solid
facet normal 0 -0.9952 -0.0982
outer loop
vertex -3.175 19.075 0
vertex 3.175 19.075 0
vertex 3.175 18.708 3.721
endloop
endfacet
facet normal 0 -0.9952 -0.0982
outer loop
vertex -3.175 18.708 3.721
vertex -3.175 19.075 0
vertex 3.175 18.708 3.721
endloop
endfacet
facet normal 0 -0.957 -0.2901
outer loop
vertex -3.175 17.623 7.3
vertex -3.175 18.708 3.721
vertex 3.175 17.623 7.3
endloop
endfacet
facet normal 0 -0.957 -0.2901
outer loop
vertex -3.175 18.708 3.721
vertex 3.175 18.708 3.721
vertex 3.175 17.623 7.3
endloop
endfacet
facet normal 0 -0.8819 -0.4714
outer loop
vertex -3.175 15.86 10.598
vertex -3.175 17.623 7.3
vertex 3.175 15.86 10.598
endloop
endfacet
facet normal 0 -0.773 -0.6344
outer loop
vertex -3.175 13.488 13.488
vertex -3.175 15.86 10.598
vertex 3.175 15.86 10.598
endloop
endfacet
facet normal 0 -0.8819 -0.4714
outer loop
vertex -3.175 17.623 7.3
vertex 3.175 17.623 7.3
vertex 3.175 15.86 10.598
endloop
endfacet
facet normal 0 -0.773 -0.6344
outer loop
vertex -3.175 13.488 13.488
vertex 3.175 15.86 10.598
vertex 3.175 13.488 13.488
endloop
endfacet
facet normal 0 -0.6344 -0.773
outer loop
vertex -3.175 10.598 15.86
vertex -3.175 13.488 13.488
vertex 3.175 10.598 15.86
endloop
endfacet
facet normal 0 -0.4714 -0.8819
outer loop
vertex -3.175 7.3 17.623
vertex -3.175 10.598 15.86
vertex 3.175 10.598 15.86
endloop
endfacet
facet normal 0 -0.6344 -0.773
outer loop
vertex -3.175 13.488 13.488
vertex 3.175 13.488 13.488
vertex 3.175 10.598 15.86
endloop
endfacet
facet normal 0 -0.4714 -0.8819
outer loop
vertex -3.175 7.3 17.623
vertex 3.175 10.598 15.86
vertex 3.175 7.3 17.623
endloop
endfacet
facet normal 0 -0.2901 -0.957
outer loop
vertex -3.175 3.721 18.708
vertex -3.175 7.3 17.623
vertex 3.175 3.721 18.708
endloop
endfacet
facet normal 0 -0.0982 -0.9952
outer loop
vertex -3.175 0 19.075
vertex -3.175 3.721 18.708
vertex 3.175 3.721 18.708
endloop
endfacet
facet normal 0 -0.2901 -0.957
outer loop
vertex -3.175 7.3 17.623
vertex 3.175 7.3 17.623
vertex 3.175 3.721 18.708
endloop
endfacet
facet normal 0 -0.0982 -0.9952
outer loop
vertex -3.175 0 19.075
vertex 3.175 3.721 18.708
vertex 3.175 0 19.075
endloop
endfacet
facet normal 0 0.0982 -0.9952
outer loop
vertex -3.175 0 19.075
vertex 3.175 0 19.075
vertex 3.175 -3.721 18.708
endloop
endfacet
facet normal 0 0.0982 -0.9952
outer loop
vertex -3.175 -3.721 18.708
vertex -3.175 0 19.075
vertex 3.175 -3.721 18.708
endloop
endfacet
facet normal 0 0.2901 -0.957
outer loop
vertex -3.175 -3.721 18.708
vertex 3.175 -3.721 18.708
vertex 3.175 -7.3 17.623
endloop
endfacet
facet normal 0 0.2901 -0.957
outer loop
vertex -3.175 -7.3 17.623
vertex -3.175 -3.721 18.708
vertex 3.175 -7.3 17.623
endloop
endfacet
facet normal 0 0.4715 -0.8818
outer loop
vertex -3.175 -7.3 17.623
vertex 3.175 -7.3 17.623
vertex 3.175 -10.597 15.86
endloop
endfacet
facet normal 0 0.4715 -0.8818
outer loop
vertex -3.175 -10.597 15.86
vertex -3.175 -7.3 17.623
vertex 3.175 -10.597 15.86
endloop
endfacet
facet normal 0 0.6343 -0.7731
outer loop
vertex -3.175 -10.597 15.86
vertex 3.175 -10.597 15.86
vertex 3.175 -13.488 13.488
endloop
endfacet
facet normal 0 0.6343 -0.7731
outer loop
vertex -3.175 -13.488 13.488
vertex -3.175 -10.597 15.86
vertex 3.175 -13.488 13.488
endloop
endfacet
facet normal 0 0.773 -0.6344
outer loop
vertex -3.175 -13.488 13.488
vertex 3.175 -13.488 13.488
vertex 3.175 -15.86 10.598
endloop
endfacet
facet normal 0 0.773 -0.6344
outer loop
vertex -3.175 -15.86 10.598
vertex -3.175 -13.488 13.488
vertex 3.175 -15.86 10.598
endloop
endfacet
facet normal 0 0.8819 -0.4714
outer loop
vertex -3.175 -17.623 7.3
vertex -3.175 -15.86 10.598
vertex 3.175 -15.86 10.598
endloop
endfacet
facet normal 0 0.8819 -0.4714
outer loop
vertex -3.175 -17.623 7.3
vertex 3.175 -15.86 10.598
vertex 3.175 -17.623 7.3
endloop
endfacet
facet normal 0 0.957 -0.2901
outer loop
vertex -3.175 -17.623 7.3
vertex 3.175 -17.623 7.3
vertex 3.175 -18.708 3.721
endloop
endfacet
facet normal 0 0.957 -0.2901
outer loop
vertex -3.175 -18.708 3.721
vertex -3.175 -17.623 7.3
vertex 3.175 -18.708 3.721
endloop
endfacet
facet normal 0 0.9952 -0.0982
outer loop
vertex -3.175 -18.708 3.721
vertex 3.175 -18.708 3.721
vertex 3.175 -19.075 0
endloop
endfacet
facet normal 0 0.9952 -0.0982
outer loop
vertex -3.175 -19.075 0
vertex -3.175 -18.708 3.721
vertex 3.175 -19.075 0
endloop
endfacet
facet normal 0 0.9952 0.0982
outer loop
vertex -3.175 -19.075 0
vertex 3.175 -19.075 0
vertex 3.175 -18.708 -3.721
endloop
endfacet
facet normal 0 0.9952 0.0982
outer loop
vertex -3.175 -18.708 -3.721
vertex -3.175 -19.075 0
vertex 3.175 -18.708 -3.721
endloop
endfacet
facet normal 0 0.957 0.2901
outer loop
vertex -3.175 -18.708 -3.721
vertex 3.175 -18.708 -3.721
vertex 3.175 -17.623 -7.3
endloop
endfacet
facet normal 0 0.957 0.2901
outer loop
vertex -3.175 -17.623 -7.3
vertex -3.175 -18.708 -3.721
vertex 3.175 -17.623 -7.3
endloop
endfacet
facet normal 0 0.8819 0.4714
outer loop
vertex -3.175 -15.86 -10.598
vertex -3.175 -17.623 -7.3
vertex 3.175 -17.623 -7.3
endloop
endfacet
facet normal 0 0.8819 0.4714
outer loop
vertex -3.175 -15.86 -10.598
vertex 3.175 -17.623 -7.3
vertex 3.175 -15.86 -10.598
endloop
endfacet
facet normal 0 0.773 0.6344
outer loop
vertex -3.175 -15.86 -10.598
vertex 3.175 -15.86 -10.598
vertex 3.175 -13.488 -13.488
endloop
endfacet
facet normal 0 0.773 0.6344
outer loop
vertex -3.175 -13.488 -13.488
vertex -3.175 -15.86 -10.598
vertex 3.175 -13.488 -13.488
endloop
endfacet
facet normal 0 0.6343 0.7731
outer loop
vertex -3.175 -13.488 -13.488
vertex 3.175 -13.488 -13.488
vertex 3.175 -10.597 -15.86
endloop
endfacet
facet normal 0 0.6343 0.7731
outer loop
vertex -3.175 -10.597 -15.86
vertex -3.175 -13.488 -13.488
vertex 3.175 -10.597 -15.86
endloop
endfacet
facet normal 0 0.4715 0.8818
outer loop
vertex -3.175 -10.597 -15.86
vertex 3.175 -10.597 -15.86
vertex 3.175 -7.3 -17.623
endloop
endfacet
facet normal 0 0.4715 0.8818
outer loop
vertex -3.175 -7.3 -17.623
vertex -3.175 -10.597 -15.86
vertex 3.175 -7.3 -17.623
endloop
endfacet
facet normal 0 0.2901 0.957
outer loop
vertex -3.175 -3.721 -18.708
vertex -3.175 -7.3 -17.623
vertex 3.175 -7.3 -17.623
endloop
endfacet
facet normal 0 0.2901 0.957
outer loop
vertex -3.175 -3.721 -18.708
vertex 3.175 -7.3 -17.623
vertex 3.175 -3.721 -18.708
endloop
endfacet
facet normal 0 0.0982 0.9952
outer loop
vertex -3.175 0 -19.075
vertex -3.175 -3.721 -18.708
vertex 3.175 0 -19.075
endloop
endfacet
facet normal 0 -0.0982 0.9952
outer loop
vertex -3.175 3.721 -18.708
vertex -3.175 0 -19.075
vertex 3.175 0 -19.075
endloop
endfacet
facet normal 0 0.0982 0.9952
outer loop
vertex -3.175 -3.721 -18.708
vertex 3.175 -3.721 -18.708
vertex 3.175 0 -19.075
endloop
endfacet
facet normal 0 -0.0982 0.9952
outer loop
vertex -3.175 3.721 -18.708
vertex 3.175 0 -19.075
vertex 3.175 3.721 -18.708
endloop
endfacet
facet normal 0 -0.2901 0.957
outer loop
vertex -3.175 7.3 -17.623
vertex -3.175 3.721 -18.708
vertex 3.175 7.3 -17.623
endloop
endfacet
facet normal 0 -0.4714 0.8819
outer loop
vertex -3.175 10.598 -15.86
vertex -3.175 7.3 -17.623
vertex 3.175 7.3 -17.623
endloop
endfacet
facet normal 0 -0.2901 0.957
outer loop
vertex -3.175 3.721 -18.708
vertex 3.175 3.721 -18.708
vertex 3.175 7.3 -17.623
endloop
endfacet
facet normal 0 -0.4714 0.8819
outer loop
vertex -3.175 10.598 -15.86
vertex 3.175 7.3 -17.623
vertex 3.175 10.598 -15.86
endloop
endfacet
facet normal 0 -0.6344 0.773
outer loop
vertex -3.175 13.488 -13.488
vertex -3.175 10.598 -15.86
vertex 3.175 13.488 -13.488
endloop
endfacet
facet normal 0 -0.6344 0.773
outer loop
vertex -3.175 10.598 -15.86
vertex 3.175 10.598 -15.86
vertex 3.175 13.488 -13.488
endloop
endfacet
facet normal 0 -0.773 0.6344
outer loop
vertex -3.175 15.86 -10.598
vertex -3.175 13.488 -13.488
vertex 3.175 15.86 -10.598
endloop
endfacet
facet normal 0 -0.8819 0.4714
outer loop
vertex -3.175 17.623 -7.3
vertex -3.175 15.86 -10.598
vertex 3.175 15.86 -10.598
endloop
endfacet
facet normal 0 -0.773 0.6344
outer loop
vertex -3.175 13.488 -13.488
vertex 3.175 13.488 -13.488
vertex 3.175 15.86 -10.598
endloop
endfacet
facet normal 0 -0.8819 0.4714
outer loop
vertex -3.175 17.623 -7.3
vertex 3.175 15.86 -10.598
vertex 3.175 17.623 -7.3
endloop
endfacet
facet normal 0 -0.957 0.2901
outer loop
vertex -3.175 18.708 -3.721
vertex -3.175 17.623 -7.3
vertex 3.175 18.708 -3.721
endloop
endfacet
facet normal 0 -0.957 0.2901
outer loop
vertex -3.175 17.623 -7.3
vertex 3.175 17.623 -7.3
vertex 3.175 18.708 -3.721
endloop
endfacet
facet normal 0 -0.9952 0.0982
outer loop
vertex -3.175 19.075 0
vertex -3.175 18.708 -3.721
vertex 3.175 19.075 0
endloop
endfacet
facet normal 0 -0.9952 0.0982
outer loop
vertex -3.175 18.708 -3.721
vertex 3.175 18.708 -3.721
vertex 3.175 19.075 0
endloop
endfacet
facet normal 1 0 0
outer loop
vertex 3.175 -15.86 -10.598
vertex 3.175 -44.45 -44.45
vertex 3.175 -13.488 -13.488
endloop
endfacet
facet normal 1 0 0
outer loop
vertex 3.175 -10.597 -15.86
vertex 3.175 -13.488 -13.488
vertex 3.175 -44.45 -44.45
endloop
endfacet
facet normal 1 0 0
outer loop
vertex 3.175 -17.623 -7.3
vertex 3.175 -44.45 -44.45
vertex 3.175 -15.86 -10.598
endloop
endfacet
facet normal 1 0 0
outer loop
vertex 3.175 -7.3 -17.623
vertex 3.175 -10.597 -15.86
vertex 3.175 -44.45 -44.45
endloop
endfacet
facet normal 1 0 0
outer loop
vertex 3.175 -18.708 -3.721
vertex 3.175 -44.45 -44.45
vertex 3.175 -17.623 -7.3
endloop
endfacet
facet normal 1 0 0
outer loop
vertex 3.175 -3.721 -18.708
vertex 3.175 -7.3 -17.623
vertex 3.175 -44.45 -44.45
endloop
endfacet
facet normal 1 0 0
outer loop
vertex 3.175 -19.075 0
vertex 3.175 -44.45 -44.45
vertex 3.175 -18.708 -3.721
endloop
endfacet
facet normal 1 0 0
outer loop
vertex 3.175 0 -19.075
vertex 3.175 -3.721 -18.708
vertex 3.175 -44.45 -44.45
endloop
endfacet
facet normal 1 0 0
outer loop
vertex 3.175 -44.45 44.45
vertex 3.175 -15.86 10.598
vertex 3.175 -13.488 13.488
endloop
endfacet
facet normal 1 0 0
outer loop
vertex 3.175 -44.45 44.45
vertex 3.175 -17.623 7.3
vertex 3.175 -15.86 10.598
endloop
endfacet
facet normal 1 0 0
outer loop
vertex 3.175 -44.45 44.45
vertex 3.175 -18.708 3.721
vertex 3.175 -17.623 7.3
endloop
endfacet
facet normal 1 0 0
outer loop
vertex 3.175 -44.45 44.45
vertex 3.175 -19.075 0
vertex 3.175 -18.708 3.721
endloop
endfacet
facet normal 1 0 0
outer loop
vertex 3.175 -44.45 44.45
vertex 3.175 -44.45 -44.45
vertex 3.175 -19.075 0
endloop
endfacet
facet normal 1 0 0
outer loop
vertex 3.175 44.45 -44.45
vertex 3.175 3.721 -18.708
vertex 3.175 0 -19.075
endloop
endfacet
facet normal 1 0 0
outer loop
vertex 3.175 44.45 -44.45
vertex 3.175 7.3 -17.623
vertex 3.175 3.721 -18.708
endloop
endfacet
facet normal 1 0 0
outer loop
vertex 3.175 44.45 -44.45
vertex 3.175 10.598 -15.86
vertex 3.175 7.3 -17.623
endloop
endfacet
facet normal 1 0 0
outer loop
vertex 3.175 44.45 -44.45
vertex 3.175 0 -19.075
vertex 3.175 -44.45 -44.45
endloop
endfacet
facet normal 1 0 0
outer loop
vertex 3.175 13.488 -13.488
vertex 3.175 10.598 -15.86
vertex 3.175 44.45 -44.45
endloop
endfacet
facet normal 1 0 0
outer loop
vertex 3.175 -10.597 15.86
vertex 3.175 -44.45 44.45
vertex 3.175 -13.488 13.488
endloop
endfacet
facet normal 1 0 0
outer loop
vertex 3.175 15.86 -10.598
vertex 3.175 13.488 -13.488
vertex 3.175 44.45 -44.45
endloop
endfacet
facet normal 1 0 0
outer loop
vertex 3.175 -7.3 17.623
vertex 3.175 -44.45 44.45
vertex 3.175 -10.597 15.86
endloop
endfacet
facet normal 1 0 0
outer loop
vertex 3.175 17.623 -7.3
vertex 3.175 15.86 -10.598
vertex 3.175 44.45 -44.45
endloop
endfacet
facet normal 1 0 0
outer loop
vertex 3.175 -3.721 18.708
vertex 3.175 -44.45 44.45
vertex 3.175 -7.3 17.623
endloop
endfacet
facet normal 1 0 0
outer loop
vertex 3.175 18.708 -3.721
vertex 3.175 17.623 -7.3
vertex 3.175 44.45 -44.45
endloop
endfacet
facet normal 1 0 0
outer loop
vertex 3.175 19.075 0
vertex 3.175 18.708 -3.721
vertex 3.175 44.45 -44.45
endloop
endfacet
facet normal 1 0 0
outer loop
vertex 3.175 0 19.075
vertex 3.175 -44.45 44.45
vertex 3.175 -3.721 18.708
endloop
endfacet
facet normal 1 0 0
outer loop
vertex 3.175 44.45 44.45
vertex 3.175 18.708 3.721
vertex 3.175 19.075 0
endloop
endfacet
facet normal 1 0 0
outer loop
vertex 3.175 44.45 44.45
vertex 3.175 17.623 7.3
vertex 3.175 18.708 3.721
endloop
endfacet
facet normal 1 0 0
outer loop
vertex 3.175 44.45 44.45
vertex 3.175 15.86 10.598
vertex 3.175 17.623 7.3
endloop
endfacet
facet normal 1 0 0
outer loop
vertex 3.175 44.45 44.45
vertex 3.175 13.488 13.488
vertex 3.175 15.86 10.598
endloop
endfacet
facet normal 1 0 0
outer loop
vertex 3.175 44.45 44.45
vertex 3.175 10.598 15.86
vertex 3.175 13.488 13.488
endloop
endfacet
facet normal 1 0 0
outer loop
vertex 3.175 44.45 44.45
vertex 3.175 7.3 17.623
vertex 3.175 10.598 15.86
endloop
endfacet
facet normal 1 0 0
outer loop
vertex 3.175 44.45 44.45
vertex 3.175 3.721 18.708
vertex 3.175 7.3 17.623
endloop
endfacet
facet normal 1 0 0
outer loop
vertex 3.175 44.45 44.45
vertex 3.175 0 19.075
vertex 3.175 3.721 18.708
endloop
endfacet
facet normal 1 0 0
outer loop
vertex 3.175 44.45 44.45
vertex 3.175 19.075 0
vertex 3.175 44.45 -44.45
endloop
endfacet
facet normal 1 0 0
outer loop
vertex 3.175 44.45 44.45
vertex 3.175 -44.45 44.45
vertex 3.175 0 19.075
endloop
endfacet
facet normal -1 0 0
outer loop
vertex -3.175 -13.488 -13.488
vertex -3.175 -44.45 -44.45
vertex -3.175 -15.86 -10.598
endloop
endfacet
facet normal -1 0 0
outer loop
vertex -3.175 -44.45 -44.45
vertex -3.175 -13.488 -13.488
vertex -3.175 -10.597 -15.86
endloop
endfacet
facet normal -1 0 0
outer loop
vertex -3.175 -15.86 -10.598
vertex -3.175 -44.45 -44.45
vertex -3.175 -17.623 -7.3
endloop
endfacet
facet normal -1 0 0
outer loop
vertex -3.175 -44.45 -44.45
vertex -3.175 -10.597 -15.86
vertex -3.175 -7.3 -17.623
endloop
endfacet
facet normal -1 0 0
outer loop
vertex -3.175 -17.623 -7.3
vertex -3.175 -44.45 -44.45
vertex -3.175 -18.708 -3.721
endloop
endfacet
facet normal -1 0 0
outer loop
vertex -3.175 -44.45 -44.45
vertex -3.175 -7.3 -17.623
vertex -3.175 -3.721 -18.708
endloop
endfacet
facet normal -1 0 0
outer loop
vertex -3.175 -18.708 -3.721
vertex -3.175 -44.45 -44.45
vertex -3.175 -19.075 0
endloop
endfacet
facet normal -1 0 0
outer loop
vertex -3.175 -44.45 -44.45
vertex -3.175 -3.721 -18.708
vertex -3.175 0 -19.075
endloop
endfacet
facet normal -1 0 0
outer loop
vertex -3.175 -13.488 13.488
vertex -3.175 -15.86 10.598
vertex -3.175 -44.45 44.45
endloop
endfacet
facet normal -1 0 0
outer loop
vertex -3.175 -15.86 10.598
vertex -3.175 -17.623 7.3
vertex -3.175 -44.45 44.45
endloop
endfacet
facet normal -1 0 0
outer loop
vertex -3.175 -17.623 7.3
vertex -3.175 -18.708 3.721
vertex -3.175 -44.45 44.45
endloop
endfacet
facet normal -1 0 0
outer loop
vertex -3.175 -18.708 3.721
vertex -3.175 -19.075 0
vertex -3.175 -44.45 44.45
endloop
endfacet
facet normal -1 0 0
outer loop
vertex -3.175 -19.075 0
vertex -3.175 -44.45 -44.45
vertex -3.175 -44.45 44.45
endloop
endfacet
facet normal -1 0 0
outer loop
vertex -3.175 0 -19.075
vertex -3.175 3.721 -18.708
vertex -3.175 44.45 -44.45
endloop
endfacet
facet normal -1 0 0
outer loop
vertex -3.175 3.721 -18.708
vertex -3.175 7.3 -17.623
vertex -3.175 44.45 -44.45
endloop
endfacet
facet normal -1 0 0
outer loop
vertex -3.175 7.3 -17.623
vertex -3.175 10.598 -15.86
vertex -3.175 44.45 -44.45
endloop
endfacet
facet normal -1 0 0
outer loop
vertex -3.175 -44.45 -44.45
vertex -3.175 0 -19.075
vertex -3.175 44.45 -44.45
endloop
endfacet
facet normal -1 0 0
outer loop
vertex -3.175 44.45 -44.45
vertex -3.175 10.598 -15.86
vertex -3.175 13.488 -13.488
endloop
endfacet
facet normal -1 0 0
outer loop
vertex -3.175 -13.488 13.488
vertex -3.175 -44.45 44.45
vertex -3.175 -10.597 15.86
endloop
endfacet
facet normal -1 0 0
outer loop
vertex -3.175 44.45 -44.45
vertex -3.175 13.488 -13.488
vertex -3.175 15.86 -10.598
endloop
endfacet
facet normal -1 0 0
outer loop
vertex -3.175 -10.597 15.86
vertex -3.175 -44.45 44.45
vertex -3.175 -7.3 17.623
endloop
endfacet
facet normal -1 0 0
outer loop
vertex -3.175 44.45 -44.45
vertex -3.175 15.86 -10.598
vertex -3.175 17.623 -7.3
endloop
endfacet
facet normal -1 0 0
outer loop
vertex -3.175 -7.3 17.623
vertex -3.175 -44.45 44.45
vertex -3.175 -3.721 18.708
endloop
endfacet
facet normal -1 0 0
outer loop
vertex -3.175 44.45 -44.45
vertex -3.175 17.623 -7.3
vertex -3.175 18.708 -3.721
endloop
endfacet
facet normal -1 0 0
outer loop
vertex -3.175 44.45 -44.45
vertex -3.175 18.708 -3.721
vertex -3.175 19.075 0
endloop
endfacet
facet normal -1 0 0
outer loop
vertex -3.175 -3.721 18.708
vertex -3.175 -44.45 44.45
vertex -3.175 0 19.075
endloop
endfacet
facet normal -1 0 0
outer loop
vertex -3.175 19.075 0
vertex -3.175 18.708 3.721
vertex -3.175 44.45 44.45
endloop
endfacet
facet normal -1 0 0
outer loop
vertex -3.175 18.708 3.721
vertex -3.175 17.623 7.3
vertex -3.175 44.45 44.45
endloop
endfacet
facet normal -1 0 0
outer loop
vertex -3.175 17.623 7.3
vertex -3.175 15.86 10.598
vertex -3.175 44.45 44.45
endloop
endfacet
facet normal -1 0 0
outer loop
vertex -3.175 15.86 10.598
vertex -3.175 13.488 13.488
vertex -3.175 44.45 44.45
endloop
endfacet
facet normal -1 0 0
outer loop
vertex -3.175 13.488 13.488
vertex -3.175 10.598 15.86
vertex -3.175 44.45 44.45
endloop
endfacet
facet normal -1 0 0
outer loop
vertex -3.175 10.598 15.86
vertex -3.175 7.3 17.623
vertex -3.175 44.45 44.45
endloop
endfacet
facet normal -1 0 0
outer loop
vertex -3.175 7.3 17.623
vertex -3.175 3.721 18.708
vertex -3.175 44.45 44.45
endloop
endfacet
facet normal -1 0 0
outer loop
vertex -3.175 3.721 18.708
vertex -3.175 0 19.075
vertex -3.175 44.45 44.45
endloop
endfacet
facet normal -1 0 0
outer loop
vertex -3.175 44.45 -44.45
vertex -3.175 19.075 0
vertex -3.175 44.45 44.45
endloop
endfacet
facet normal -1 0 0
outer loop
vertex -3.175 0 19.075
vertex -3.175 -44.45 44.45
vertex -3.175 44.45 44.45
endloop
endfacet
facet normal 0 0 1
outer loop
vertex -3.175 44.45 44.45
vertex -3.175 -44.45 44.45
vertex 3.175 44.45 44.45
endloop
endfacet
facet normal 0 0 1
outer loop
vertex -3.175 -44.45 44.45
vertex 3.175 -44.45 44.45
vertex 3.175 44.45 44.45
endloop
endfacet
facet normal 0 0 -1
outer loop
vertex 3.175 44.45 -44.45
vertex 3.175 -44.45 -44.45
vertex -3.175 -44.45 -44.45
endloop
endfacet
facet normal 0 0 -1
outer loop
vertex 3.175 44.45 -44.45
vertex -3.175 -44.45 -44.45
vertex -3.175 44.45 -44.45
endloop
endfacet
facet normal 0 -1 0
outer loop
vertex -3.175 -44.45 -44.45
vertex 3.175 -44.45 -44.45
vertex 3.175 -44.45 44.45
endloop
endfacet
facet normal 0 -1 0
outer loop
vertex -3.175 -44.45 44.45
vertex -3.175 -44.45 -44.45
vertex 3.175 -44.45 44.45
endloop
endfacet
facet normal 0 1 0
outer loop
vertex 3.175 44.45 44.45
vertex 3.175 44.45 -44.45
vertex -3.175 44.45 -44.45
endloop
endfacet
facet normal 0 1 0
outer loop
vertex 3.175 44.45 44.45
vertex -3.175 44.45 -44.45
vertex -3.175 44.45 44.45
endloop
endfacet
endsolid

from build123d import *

# Parameters (mm, degrees)
F0_W     = 88.9
F0_H     = 88.9
F1_DEPTH = 3.175
F3_D     = 38.15


with BuildPart() as f1:
    # F0 (on Right) → F1 (new body, symmetric)
    with BuildSketch(Plane.YZ):
        with Locations((1.86388e-05, 0)):
            Rectangle(F0_W, F0_H)
    extrude(amount=F1_DEPTH, both=True)

    # F3 (through all)
    with Locations(Plane(origin=(-3.175, 0, 0), x_dir=(0, -1, 0), z_dir=(-1, 0, 0))):
        with Locations((-1.86388e-05, 0)):
            Hole(F3_D / 2)


solid = f1.part
